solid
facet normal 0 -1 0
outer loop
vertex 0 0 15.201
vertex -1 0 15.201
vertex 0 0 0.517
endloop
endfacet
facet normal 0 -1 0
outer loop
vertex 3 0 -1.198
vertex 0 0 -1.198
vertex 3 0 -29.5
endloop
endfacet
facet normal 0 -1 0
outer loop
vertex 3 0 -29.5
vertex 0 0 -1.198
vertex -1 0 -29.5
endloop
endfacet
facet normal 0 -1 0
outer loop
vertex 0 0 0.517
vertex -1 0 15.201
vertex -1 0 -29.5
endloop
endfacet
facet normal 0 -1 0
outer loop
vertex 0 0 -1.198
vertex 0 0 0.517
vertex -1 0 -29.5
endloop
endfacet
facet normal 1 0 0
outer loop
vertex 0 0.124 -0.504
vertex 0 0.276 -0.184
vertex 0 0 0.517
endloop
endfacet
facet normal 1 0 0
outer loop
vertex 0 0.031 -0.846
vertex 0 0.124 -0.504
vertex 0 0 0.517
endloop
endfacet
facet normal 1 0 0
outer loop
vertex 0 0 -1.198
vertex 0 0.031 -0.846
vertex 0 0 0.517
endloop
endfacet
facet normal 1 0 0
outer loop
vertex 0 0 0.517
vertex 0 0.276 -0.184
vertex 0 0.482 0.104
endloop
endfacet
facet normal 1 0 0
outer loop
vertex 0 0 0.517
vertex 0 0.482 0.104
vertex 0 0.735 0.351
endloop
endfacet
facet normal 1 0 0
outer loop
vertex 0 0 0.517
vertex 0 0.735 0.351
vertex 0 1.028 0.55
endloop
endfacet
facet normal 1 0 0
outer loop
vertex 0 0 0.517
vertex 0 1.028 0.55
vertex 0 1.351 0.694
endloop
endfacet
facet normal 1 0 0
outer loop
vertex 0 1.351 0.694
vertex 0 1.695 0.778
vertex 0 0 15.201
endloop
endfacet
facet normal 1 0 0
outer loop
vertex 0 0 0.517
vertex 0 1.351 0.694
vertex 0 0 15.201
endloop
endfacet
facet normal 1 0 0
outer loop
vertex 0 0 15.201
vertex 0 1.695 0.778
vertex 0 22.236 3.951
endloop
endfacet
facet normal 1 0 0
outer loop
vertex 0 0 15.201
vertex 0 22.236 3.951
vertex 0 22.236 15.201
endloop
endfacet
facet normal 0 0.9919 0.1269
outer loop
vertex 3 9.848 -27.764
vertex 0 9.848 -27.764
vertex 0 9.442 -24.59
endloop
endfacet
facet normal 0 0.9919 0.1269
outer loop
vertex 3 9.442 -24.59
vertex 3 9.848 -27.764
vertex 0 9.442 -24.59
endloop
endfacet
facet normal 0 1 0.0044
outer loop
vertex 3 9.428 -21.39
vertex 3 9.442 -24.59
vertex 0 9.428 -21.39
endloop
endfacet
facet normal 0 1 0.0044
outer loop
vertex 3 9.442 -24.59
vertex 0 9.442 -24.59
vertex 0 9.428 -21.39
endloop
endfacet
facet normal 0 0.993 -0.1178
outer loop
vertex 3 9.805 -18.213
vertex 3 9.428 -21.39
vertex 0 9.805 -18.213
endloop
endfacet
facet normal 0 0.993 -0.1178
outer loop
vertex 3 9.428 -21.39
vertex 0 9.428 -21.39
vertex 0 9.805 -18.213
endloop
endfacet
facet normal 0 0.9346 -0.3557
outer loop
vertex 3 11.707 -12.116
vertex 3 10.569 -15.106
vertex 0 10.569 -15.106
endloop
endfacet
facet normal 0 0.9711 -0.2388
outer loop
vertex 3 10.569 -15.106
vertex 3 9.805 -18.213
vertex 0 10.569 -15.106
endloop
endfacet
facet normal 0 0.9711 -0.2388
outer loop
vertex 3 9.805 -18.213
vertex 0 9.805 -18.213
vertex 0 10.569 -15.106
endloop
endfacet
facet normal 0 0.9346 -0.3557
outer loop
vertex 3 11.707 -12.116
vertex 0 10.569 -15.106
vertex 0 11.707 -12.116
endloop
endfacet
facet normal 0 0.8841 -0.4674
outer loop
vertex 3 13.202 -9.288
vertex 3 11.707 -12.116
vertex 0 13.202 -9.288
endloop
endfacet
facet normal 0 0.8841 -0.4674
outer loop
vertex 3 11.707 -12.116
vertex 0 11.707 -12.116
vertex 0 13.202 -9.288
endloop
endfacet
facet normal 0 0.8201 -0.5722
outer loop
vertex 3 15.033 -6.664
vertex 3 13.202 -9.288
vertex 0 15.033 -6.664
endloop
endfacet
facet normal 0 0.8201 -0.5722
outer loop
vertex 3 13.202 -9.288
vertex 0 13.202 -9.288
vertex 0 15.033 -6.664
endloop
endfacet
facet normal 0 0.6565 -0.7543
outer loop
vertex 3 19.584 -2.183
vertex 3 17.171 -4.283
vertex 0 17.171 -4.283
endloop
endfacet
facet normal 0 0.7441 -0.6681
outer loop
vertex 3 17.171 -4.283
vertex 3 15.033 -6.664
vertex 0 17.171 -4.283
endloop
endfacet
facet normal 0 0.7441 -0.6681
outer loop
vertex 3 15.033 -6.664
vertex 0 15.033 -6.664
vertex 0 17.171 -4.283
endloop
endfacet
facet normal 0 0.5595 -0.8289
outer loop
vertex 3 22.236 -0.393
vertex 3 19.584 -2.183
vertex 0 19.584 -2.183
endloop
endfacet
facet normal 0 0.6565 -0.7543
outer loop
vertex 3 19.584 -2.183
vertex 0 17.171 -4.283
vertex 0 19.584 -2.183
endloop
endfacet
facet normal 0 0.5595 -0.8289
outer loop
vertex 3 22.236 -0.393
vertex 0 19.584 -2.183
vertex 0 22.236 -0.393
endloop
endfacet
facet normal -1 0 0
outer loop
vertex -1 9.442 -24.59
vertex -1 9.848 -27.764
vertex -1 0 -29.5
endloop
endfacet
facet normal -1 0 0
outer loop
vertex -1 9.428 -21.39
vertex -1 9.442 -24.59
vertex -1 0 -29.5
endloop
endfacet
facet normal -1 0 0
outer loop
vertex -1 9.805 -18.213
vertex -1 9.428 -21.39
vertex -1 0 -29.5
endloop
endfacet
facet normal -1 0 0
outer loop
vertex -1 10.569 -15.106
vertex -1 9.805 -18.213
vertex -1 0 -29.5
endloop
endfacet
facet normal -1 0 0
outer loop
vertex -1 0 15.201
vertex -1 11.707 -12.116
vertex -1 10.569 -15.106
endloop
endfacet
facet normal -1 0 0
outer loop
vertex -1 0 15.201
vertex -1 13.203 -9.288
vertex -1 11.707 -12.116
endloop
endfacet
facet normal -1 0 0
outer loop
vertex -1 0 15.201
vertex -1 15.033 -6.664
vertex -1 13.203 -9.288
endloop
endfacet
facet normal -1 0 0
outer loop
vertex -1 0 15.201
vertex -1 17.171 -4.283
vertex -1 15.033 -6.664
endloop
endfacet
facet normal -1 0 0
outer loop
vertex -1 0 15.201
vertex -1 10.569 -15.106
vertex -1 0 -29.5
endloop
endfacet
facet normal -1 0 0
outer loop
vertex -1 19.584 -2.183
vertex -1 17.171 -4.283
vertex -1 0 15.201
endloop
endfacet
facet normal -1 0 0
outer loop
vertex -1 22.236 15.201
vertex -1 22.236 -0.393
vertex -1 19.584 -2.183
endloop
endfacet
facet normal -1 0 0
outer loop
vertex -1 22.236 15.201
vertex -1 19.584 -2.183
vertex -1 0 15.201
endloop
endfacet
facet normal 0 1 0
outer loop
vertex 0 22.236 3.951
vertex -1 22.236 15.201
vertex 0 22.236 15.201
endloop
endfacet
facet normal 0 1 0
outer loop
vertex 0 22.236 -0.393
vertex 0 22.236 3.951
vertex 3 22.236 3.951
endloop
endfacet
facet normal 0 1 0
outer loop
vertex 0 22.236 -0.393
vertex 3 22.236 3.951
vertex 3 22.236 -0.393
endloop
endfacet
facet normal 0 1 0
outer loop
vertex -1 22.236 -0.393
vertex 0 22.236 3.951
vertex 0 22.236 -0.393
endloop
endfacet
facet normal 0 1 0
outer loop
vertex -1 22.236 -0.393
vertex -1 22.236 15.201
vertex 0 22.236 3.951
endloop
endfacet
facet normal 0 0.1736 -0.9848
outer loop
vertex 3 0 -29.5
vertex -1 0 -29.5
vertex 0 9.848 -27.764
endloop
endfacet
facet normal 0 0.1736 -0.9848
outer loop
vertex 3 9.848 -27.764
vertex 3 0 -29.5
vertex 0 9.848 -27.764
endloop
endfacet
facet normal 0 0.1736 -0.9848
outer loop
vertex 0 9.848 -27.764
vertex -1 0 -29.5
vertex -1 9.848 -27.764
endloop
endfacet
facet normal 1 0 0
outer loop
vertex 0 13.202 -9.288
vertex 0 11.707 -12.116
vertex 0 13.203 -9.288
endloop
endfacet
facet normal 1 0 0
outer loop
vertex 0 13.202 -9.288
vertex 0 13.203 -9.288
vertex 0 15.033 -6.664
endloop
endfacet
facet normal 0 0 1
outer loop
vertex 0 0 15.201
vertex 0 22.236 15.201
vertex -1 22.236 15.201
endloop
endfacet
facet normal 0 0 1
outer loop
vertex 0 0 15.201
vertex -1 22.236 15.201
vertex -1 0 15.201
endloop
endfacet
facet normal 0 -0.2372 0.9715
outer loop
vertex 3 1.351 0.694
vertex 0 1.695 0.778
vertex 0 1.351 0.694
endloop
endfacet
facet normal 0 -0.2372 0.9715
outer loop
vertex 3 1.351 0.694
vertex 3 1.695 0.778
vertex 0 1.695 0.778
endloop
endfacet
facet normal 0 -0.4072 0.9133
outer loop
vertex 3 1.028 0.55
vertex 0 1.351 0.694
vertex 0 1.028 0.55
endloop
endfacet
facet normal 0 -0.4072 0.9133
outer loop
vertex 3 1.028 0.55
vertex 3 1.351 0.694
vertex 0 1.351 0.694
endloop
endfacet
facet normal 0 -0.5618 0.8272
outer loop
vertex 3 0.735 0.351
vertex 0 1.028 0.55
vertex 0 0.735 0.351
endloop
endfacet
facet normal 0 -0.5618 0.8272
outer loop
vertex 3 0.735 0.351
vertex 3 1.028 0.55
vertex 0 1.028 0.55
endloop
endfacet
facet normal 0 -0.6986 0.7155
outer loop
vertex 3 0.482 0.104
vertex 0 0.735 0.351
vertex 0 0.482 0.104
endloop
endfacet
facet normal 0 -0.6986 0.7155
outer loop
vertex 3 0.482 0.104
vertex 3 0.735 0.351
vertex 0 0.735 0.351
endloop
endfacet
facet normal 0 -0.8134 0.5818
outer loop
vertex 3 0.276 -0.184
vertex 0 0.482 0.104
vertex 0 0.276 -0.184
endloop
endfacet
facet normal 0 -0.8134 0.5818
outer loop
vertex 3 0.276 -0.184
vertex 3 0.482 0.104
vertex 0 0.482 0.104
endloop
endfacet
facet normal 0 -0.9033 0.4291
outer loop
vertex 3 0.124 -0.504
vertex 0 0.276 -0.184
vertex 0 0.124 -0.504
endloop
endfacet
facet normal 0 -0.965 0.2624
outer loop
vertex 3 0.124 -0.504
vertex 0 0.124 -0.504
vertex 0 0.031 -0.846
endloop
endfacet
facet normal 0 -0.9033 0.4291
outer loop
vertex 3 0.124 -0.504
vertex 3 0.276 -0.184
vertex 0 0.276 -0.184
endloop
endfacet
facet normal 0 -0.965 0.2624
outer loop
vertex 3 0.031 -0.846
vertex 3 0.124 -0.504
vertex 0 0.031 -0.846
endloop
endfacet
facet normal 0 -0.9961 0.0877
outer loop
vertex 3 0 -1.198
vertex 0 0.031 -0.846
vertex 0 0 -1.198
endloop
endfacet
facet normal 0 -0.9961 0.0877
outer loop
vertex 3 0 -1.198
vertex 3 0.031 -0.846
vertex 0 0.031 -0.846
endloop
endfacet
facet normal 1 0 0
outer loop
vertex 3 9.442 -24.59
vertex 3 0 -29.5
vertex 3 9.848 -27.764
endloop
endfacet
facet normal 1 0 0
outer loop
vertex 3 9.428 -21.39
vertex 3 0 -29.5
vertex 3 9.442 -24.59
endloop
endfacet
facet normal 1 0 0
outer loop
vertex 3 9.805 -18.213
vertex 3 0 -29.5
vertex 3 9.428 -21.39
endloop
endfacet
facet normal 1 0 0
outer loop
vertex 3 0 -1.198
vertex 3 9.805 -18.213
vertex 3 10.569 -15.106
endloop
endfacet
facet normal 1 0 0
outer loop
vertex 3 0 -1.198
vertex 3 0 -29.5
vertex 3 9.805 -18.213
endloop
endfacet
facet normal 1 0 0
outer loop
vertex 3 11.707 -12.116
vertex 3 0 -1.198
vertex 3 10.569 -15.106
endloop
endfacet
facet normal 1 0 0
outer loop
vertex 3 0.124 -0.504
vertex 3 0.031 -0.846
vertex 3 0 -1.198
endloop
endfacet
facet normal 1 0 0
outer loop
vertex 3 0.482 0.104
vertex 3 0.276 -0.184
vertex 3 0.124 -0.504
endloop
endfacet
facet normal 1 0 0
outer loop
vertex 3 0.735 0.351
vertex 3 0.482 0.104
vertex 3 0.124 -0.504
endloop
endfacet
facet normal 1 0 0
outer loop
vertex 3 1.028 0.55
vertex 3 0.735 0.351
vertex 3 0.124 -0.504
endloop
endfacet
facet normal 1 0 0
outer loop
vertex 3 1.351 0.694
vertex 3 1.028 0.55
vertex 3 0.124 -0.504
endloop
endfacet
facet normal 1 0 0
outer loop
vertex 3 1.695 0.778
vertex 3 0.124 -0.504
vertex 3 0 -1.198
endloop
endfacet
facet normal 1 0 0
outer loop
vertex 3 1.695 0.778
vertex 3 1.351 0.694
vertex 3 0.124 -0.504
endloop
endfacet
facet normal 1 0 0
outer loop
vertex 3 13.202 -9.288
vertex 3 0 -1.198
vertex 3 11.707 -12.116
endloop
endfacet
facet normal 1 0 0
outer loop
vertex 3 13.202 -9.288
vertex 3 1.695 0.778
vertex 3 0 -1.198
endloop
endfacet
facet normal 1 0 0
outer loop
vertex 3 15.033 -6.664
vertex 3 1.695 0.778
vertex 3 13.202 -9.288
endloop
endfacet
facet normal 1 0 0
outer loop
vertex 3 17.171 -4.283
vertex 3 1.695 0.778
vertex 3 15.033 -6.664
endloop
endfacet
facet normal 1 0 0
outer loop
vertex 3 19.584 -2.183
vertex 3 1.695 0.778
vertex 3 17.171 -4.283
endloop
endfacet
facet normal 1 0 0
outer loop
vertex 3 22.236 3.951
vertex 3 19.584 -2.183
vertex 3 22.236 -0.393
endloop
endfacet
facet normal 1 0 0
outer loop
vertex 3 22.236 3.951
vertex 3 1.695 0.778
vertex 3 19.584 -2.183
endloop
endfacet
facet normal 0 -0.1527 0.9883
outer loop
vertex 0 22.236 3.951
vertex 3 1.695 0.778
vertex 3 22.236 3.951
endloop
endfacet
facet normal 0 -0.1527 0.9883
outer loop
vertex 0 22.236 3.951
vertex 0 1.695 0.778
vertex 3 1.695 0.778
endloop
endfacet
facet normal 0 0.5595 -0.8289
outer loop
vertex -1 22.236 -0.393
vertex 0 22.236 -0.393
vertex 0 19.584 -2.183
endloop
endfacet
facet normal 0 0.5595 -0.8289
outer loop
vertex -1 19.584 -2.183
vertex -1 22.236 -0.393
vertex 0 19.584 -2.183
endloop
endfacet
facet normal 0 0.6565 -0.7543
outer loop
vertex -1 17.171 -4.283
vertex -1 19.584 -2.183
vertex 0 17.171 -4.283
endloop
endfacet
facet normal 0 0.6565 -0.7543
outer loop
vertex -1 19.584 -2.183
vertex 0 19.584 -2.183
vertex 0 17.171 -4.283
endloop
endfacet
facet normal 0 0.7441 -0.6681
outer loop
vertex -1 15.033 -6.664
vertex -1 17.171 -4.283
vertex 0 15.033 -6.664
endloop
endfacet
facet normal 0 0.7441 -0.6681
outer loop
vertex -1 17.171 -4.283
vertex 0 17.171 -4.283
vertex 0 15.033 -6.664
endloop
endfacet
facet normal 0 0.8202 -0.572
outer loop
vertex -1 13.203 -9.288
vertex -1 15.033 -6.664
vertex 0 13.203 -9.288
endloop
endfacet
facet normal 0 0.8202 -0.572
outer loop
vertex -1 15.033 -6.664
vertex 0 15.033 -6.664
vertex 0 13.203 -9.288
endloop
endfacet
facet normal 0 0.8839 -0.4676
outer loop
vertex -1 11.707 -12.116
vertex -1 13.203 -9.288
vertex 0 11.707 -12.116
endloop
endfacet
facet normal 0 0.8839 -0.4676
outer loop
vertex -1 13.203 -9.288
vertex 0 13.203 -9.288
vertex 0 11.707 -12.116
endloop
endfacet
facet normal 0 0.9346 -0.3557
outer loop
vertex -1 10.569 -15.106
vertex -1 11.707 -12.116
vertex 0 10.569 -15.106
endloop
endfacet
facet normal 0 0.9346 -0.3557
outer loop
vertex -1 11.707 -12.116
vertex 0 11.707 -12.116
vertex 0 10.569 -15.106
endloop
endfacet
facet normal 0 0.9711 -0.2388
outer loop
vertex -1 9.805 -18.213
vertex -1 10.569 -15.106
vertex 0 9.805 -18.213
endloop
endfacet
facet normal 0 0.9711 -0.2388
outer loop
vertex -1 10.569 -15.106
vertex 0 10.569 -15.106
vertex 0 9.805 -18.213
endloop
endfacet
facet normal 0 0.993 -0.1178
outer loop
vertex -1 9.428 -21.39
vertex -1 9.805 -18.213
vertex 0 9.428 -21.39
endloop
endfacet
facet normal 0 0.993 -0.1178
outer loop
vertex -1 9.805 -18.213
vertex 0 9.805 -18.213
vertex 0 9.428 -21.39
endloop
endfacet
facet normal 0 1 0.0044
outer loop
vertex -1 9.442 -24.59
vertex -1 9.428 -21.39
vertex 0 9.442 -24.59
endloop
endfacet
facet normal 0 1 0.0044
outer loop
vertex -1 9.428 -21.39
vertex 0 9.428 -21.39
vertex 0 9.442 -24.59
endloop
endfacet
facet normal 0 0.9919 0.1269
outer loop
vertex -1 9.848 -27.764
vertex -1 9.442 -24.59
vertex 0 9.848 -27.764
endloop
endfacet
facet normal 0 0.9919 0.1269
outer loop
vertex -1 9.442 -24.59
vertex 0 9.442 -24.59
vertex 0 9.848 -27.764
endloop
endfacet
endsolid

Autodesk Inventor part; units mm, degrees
ref_plane "YZ Plane" through (0, 0, 0) normal (1, 0, 0) x (0, 1, 0)
ref_plane "XZ Plane" through (0, 0, 0) normal (0, 1, 0) x (-1, 0, 0)
ref_plane "XY Plane" through (0, 0, 0) normal (0, 0, 1) x (1, 0, 0)
sketch "Sketch1" plane through (0, 0, 0) normal (1, 0, 0) x (0, 1, 0)
  line L0 (0, 0.5167) -> (0, -29.5)
  line L1 (0, 0.5167) -> (22.2363, 3.9511)
  line L2 (22.2363, 3.9511) -> (22.2363, -0.3932)
  arc A0 (22.2363, -0.3932) -> (9.8481, -27.7635) centre (35.4748, -22.8739) ccw
  line L3 (0, -29.5) -> (9.8481, -27.7635)
  point P0 (0, 0)
  dimension "d0" = 30.0167
  dimension "d1" = 22.5
  dimension "d2" = 98.78
  dimension "d3" = 9.8481
  dimension "d4" = 80
  dimension "d5" = 26.089
  dimension "d6" = 13.2384
extrude "Extrusion1" add sketch "Sketch1" along normal blind 3
sketch "Sketch2" plane through (0, 0, 0) normal (-1, 0, 0) x (0, 0, 1)
  line L0 (0.5167, 0) -> (-29.5, 0) projected
  line L1 (3.9511, 22.2363) -> (0.5167, 0) projected
  line L2 (-0.3932, 22.2363) -> (3.9511, 22.2363) projected
  arc A0 (-27.7635, 9.8481) -> (-0.3932, 22.2363) centre (-22.8739, 35.4748) ccw projected
  line L3 (-29.5, 0) -> (-27.7635, 9.8481) projected
  line L4 (3.9511, 22.2363) -> (15.2011, 22.2363)
  line L5 (15.2011, 22.2363) -> (15.2011, 0)
  line L6 (15.2011, 0) -> (-29.5, 0)
  line L7 (0, 0) -> (-29.5, 0) projected
  line L8 (-29.5, 0) -> (-27.7635, 9.8481) projected
  line L9 (-29.5, 0) -> (-27.7635, 9.8481)
  line L10 (3.9511, 22.2363) -> (0.5046, -0.0779) projected
  line L11 (3.9511, 22.2363) -> (-0.3932, 22.2363)
  arc A1 (-27.7635, 9.8481) -> (-0.3932, 22.2363) centre (-22.8739, 35.4748) ccw projected
  arc A2 (-27.7635, 9.8481) -> (-0.3932, 22.2363) centre (-22.8739, 35.4748) ccw
  dimension "d9" = 11.25
extrude "Extrusion2" add sketch "Sketch2" along normal blind 1
fillet "Fillet1" radius 2 1 edges at (1.5, 0, 0.5167)
properties part number "jam-protector-two"
